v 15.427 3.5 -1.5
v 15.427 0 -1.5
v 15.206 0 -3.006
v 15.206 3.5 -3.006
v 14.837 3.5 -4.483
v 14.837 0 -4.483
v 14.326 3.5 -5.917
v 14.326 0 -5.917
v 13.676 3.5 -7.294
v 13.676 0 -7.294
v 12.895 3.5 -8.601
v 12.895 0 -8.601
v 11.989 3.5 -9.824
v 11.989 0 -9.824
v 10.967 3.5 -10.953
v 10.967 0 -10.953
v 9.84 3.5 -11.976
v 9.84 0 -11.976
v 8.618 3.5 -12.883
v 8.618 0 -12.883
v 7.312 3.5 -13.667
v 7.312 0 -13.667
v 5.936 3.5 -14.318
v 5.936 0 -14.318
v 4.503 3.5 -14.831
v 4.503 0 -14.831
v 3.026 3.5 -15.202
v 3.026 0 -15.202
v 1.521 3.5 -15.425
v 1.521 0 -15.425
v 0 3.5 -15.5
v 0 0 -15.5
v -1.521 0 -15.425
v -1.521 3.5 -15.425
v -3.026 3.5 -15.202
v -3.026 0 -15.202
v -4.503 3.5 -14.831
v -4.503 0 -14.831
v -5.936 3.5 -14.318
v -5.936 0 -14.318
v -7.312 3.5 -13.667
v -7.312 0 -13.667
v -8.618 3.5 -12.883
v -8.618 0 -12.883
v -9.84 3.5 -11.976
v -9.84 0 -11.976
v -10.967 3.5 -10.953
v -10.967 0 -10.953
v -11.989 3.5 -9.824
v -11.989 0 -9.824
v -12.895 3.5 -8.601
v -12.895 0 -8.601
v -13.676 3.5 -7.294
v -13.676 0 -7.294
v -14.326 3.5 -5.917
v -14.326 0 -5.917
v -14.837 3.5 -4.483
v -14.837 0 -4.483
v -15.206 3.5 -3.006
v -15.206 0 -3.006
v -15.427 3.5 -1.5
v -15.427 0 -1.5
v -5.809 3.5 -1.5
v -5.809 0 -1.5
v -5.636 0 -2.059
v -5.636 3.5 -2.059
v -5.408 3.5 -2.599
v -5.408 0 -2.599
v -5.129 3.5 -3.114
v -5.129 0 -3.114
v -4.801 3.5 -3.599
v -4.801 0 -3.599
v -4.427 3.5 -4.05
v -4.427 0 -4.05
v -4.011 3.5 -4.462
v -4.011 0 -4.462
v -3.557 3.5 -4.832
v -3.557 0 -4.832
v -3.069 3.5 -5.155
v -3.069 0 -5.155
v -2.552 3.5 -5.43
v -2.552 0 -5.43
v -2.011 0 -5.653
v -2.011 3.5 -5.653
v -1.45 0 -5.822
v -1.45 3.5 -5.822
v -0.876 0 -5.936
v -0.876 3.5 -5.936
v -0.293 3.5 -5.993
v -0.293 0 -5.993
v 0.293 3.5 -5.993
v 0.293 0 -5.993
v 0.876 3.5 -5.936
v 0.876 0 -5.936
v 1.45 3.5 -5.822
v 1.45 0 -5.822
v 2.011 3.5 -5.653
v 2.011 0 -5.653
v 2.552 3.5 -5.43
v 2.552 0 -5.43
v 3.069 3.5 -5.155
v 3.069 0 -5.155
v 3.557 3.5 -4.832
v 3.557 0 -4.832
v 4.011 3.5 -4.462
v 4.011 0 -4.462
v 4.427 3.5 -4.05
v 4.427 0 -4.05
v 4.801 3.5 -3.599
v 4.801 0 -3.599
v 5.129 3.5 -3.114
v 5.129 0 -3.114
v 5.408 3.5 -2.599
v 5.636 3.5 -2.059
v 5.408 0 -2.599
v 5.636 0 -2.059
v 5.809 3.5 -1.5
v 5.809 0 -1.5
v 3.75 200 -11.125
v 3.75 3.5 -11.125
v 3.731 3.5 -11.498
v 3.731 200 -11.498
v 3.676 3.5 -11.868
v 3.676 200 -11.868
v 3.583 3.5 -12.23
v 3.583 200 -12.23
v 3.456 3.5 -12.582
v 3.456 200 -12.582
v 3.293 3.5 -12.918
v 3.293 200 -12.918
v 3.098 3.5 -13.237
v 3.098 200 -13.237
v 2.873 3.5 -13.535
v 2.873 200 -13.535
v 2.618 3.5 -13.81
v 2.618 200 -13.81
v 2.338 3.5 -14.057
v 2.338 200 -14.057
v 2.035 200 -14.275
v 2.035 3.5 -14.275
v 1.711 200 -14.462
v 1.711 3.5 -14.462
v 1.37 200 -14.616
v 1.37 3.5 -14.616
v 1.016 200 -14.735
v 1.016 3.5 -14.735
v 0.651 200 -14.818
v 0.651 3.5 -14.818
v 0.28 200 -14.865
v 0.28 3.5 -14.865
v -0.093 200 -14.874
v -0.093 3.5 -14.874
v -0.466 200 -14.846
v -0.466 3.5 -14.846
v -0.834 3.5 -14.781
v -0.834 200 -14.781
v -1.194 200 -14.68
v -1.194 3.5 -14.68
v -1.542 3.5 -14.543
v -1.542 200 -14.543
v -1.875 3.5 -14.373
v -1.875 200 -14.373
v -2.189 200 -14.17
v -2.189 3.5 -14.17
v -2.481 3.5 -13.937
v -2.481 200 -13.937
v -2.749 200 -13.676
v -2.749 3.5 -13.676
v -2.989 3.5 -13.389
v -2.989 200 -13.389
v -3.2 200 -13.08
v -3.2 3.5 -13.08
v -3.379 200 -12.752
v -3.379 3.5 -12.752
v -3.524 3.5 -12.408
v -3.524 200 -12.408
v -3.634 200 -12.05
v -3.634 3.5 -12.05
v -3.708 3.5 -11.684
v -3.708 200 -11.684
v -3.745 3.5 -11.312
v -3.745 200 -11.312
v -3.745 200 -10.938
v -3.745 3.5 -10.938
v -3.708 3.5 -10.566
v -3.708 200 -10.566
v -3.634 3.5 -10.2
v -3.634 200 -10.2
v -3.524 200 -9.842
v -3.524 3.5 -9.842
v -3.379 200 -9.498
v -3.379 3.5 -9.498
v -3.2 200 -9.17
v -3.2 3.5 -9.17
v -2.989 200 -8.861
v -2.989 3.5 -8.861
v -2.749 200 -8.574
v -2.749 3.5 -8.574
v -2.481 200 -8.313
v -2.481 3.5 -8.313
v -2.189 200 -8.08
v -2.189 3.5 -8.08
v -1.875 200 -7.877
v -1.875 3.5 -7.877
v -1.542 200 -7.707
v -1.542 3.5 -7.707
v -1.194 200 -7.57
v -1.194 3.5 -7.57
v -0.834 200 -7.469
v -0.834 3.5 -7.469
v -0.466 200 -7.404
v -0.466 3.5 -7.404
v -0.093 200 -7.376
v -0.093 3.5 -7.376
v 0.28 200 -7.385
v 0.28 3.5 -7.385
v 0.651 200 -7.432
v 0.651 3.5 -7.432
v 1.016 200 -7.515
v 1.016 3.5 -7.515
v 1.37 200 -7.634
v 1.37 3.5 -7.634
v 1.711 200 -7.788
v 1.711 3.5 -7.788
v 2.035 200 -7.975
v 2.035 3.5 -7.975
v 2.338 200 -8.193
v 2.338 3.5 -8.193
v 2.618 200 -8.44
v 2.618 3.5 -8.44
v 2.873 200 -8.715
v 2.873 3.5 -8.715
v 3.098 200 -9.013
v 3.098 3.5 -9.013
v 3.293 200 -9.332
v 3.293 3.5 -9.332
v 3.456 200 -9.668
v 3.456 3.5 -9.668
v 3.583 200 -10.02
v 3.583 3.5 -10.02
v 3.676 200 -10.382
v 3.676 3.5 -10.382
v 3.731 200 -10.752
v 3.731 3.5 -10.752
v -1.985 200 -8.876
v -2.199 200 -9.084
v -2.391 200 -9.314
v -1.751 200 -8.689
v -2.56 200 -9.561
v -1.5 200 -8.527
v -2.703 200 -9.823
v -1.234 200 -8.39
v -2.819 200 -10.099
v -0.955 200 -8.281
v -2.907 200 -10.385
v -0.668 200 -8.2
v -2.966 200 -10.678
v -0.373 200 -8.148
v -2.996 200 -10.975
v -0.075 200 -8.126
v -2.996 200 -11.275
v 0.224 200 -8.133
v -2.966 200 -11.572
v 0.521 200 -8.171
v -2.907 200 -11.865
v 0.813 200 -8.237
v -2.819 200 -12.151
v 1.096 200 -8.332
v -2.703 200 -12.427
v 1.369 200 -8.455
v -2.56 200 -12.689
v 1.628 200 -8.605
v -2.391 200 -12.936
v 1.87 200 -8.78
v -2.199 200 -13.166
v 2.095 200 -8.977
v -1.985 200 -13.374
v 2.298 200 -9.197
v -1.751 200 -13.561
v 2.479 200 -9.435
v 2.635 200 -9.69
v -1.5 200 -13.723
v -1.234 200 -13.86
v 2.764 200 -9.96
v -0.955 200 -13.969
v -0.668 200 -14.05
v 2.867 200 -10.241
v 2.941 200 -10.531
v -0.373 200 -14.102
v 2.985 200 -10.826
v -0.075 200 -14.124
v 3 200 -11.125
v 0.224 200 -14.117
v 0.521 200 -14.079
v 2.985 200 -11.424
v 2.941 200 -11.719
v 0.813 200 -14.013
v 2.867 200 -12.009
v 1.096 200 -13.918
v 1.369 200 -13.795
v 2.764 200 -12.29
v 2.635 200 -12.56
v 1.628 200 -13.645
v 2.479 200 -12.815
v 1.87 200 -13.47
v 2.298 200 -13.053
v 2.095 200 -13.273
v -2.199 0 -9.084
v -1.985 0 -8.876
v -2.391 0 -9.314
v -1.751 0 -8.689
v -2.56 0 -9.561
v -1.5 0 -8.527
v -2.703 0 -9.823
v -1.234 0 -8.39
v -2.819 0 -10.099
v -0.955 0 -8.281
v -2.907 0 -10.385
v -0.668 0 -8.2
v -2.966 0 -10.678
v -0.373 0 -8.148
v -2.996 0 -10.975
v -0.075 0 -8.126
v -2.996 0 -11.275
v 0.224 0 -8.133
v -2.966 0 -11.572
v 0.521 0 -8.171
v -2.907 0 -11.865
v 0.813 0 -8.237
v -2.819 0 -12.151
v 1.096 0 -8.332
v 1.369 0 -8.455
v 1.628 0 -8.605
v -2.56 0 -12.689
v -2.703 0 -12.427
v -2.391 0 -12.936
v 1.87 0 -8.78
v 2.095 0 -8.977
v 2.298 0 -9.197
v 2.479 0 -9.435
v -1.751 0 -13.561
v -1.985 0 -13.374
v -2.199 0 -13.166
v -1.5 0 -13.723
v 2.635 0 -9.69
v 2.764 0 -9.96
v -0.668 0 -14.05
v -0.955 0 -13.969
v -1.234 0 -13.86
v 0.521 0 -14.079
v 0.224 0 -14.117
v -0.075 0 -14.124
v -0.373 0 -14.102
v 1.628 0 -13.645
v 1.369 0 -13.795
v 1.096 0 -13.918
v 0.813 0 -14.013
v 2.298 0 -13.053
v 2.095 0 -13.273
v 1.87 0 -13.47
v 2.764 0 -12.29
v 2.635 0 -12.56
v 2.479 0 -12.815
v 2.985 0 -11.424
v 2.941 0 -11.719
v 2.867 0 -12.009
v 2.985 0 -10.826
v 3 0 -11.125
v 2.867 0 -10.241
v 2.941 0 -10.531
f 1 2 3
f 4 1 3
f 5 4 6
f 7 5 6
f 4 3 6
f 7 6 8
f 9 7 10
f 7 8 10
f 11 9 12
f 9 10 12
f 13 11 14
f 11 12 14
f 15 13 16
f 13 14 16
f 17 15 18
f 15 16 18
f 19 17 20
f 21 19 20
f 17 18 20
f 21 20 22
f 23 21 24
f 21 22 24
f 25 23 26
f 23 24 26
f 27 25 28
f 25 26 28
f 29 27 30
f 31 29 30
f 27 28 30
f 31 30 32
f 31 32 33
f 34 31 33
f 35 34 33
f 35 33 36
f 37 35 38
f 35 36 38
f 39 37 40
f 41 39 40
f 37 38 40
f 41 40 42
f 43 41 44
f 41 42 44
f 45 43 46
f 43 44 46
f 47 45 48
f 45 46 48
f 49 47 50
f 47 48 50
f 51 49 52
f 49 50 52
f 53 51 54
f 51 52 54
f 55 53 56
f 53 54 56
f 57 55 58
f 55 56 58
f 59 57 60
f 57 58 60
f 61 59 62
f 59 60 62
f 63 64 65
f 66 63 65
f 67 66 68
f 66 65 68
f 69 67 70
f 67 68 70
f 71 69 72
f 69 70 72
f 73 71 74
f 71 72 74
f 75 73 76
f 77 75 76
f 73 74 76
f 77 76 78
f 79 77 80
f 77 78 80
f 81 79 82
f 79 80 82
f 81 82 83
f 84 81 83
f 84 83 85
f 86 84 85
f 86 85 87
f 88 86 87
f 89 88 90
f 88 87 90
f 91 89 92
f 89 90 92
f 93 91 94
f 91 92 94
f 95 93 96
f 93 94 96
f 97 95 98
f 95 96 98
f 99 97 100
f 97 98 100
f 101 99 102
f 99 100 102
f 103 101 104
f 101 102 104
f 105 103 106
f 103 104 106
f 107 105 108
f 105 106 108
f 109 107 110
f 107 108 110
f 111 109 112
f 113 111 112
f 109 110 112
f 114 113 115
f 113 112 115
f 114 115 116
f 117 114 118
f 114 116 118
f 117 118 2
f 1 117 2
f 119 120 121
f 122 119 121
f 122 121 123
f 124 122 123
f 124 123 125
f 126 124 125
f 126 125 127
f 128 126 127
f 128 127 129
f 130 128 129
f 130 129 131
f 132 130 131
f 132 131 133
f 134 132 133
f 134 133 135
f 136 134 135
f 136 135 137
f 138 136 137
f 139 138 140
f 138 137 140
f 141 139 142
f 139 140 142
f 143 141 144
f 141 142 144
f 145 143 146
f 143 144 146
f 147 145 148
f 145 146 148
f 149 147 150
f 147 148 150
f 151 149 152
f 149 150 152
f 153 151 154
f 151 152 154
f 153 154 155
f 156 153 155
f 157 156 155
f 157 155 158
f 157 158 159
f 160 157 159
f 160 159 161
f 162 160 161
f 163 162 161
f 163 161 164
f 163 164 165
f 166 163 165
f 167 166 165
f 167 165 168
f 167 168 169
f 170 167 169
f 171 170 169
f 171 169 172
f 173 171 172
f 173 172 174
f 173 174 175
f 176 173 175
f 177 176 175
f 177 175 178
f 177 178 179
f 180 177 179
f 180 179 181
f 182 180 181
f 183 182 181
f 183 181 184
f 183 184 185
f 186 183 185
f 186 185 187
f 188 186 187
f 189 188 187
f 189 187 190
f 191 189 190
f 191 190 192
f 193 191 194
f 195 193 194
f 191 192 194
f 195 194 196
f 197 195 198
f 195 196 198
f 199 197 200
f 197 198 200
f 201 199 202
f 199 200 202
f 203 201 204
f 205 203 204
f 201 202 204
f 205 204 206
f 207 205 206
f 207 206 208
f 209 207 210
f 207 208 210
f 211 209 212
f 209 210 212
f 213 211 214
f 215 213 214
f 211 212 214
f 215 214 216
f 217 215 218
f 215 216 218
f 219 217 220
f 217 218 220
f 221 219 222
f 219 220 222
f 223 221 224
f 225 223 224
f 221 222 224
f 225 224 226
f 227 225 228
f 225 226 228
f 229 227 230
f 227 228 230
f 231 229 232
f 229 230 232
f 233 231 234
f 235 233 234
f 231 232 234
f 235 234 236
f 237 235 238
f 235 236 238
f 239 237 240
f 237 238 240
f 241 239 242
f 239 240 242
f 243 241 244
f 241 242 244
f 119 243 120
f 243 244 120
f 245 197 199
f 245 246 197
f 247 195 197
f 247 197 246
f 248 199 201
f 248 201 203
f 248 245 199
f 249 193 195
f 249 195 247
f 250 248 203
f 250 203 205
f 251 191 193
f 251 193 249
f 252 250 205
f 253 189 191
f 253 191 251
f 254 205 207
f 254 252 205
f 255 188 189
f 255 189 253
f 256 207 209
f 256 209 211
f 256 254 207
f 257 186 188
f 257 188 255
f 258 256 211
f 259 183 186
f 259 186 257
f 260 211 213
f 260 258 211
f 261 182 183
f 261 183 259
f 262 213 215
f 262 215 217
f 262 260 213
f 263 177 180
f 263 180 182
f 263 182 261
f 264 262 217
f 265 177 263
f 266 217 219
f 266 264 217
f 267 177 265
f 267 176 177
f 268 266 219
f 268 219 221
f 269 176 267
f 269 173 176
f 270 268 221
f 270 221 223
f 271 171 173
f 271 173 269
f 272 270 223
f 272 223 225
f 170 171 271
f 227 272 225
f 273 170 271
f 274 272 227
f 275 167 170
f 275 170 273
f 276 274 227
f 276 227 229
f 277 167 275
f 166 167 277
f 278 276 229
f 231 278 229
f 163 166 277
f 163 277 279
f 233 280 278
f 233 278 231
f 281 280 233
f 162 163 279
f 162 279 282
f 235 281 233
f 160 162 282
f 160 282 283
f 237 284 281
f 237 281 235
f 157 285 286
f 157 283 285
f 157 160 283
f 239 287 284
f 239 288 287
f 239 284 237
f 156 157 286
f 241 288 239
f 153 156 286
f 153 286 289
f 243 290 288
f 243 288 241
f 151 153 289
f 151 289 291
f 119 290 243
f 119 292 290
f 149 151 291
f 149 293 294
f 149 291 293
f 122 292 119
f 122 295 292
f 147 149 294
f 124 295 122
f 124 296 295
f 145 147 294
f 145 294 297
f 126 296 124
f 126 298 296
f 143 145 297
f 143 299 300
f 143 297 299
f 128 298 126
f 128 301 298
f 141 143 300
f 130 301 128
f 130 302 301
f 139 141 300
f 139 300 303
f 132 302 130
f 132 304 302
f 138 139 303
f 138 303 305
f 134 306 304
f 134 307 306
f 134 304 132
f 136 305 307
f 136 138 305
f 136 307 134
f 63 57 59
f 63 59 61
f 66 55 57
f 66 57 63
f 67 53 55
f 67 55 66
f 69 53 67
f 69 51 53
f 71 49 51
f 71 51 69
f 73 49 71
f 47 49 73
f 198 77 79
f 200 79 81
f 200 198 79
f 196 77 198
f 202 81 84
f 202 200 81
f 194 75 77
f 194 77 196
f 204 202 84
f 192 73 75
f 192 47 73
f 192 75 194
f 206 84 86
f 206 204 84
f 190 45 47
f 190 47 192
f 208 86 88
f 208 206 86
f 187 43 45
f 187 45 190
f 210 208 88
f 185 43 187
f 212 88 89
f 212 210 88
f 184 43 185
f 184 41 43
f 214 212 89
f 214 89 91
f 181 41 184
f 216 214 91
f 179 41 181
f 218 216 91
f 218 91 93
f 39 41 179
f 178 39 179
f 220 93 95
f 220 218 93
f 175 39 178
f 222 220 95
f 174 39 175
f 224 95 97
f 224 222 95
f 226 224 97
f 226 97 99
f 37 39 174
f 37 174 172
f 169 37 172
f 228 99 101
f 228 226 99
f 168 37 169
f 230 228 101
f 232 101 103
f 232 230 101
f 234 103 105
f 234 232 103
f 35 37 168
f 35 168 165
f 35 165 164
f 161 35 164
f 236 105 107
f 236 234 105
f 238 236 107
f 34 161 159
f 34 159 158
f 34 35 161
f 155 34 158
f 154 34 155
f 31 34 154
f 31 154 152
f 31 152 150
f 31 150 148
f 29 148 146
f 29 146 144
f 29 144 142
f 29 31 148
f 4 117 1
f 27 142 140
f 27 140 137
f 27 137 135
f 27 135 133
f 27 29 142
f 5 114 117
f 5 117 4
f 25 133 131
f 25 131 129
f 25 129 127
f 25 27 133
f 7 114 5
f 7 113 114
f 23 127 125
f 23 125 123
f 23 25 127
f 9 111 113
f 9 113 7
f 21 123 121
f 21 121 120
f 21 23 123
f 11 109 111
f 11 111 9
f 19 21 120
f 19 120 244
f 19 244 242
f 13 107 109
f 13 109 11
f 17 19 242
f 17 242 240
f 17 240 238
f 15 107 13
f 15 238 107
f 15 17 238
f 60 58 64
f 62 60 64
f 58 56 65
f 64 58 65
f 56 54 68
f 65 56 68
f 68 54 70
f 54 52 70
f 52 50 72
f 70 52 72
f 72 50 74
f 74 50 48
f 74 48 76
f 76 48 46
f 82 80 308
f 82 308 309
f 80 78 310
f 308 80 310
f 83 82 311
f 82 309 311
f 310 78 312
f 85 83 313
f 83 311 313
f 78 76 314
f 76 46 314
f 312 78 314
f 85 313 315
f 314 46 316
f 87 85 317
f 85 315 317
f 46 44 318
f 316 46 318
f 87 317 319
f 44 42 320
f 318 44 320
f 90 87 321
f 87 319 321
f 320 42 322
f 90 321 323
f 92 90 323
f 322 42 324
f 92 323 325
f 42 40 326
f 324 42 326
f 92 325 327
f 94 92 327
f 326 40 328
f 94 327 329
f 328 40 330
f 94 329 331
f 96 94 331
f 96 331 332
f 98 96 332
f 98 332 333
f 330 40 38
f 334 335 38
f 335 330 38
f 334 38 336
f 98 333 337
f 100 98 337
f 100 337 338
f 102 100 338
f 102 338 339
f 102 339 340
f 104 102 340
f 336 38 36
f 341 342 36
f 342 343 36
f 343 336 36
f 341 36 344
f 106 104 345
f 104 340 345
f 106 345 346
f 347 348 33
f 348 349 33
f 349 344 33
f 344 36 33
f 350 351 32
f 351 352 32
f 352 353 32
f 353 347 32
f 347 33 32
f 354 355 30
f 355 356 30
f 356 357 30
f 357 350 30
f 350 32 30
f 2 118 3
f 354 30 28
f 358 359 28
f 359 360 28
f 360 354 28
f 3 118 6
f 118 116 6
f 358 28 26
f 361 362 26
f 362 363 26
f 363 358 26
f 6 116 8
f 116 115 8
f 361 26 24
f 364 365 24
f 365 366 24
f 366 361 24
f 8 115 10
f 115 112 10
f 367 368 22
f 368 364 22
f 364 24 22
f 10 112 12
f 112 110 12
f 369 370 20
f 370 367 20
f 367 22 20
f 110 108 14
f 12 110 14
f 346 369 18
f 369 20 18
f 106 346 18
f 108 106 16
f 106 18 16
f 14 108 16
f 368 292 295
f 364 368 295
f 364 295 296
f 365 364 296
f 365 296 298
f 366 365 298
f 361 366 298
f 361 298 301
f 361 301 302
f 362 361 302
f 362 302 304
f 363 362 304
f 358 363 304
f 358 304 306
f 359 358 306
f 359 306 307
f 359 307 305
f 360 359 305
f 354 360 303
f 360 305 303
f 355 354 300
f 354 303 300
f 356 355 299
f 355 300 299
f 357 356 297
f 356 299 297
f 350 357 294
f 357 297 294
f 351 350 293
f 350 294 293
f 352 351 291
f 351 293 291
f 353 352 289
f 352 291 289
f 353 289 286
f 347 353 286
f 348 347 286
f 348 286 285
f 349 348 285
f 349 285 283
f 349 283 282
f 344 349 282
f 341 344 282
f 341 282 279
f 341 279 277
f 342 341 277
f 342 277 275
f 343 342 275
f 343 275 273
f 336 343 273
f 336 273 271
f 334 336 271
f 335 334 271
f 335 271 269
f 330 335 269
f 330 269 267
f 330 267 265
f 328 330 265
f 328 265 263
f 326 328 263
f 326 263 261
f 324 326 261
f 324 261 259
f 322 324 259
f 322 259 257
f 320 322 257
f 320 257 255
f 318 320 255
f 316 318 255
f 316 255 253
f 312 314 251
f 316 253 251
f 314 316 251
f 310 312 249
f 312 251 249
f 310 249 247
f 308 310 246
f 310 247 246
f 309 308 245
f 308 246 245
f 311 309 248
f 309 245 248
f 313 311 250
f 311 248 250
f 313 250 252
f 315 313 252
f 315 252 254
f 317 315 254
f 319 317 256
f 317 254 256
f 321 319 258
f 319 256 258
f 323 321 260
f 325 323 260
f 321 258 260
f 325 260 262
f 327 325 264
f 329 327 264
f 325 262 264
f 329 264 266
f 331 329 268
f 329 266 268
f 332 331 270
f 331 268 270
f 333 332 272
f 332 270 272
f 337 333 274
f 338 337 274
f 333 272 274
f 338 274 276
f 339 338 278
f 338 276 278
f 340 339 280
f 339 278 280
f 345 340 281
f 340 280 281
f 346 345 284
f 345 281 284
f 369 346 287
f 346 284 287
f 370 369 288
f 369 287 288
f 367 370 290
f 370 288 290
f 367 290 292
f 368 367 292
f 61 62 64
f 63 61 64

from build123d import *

# Parameters (mm, degrees)
BOSS_EXTRUDE1_DEPTH = 3.5
SKETCH2_5_R         = 3.75
BOSS_EXTRUDE2_DEPTH = 200
SKETCH3_R           = 3
CUT_EXTRUDE1_DEPTH  = 202.192072408


with BuildPart() as part:
    # Sketch2 → Boss-Extrude1 (new body)
    with BuildSketch(Plane(origin=(0, 0, 0), x_dir=(1, 0, 0), z_dir=(0, 1, 0))):
        with BuildLine():
            ThreePointArc((15.427248621, 1.5), (0, 15.5), (-15.427248621, 1.5))
            Line((-15.427248621, 1.5), (-5.809475019, 1.5))
            ThreePointArc((-5.809475019, 1.5), (0, 6), (5.809475019, 1.5))
            Line((5.809475019, 1.5), (15.427248621, 1.5))
        make_face()
    extrude(amount=BOSS_EXTRUDE1_DEPTH)

    # Sketch2<5> → Boss-Extrude2 (add)
    with BuildSketch(Plane(origin=(0, 0, 0), x_dir=(1, 0, 0), z_dir=(0, 1, 0))):
        with Locations((0, 11.125)):
            Circle(SKETCH2_5_R)
    extrude(amount=BOSS_EXTRUDE2_DEPTH)

    # Sketch3 → Cut-Extrude1 (cut, through all)
    with BuildSketch(Plane(origin=(0, 200, 0), x_dir=(1, 0, 0), z_dir=(0, 1, 0))):
        with Locations((0, 11.125)):
            Circle(SKETCH3_R)
    extrude(amount=-CUT_EXTRUDE1_DEPTH, mode=Mode.SUBTRACT)


solid = part.part
